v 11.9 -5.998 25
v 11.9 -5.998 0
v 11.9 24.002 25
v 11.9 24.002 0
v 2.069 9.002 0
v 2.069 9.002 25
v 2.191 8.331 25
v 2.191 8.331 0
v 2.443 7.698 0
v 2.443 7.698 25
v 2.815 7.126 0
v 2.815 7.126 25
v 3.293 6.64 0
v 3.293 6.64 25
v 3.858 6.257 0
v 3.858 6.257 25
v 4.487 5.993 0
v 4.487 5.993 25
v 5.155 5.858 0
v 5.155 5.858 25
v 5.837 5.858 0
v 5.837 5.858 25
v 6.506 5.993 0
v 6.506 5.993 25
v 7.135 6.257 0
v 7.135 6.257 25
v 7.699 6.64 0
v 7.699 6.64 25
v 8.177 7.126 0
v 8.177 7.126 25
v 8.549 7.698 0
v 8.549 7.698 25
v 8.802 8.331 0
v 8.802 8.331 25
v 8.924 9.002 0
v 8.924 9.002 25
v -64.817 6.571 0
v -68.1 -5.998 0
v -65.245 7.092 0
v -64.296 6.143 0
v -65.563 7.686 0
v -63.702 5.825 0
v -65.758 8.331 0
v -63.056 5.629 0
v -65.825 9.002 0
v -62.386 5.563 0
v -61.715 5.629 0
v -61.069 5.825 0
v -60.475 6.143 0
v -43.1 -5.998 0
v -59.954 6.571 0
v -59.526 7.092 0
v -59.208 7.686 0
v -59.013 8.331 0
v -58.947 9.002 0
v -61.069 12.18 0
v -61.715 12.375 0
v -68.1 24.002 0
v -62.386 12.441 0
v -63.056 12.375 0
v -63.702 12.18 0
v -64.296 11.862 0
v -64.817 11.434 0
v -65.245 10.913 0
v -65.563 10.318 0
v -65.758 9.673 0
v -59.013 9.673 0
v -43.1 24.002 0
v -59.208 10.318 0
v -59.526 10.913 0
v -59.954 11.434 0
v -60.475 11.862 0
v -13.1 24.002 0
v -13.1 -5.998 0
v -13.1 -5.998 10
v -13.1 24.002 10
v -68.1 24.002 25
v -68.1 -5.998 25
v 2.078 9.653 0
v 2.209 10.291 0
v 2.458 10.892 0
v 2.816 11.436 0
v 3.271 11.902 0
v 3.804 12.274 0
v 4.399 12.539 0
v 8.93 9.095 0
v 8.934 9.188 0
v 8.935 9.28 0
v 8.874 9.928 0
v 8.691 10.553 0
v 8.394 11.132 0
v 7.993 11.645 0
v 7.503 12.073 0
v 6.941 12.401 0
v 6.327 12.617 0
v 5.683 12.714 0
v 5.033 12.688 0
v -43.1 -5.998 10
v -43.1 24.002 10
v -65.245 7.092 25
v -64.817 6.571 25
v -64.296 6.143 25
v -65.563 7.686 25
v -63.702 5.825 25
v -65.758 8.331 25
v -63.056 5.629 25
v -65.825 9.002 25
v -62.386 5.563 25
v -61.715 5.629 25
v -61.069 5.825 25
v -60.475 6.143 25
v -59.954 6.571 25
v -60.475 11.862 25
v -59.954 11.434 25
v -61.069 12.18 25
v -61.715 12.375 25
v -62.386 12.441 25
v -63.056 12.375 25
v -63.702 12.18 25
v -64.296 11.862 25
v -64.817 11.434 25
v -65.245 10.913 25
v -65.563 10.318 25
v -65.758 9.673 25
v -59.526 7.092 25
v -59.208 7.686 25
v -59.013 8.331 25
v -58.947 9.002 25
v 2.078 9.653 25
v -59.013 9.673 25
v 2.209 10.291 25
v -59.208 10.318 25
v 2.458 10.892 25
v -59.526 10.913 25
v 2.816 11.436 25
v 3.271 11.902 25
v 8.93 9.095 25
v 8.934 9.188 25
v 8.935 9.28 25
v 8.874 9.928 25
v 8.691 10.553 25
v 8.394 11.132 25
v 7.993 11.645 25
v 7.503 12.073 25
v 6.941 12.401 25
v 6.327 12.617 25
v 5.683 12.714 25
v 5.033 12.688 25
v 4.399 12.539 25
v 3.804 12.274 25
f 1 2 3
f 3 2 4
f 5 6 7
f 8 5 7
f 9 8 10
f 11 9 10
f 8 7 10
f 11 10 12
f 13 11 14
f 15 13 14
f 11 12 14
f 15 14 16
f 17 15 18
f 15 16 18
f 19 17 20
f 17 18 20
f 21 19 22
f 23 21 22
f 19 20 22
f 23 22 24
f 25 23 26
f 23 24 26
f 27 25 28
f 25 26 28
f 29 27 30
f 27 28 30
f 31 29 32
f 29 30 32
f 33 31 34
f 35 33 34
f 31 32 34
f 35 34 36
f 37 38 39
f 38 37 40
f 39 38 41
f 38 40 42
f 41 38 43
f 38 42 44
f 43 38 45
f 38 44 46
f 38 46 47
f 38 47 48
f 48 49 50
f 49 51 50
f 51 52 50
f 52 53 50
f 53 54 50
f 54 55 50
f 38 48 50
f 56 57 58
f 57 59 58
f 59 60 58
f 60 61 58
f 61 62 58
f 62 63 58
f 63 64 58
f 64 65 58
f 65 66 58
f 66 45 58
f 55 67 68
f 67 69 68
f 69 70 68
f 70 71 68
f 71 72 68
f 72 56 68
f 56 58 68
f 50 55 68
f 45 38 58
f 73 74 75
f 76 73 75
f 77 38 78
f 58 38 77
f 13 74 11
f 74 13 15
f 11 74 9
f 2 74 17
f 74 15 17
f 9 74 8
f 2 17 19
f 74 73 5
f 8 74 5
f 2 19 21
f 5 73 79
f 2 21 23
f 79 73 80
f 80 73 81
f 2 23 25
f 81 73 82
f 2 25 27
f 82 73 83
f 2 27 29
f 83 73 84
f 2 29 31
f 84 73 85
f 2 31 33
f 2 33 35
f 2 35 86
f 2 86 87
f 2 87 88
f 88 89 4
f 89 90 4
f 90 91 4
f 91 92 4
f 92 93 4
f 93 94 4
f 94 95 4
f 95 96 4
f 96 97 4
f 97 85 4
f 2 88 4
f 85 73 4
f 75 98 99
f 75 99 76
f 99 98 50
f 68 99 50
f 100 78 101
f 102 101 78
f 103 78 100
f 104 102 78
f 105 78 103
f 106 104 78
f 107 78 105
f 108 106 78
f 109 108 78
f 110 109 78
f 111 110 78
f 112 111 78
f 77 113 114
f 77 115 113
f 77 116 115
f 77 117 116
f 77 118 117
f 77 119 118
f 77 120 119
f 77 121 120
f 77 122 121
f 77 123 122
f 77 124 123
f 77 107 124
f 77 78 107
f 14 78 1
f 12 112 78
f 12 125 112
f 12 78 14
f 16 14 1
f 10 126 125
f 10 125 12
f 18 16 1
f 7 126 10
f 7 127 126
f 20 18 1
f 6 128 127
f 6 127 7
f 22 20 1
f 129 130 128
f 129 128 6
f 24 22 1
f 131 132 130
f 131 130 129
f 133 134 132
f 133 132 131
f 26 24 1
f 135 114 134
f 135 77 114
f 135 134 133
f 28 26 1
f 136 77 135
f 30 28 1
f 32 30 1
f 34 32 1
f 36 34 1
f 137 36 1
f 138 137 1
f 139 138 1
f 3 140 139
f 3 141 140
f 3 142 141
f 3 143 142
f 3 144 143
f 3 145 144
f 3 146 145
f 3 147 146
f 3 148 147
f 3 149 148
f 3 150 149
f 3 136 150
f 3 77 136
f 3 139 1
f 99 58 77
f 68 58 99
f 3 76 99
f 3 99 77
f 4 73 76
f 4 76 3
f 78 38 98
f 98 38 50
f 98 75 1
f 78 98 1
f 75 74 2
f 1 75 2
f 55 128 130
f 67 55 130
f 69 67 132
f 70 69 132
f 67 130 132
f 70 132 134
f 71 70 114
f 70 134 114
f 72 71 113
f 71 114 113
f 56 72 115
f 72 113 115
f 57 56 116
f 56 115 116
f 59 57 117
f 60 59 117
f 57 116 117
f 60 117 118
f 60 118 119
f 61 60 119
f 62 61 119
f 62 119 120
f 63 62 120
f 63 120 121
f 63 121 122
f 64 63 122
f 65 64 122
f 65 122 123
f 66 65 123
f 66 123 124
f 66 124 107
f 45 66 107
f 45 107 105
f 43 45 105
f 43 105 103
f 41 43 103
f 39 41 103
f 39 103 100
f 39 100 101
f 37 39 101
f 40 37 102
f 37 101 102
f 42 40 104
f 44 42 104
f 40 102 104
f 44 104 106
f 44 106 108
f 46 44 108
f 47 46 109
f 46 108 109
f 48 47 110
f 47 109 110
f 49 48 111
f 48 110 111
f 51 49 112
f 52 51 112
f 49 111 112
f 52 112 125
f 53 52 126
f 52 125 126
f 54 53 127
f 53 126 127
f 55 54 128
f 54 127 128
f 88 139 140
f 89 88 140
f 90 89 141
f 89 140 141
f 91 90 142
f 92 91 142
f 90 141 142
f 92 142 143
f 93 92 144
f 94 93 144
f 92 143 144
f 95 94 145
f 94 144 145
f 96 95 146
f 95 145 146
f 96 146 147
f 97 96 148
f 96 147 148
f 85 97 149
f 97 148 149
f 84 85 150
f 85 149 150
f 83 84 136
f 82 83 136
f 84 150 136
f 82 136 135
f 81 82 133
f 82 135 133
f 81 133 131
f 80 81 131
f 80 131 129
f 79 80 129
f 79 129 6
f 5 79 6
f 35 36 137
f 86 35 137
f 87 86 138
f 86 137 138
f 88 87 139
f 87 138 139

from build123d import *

# Parameters (mm, degrees)
F0_W     = 80
F0_H     = 30
F1_DEPTH = 25
F2_W     = 30
F2_H     = 10
F3_DEPTH = 100
F5_DEPTH = 100
F6_R     = 3.439
F7_DEPTH = 100


with BuildPart() as f1:
    # F0 (on Top) → F1 (new body)
    with BuildSketch(Plane.XY):
        with Locations((-28.100313, 9.002365)):
            Rectangle(F0_W, F0_H)
    extrude(amount=F1_DEPTH)

    # F2 (on face) → F3 (cut)
    with BuildSketch(Plane.XZ.offset(5.997635)):
        with Locations((-28.100313, -5)):
            Rectangle(F2_W, F2_H)
        with Locations((-28.100313, 5)):
            Rectangle(F2_W, F2_H)
    extrude(amount=-F3_DEPTH, mode=Mode.SUBTRACT)

    # F4 (on face) → F5 (cut)
    with BuildSketch(Plane.XY.offset(25)):
        with BuildLine():
            ThreePointArc((8.935186, 9.280235), (5.357178, 12.716382), (2.068512, 9.002365))
            Line((2.068512, 9.002365), (8.923941, 9.002365))
            ThreePointArc((8.923941, 9.002365), (8.932373, 9.141186), (8.935186, 9.280235))
        make_face()
        with BuildLine():
            Line((8.923941, 9.002365), (2.068512, 9.002365))
            ThreePointArc((2.068512, 9.002365), (5.496227, 5.841276), (8.923941, 9.002365))
        make_face()
    extrude(amount=-F5_DEPTH, mode=Mode.SUBTRACT)

    # F6 (on face) → F7 (cut)
    with BuildSketch(Plane.XY.offset(25)):
        with Locations((-62.385514, 9.002365)):
            Circle(F6_R)
    extrude(amount=-F7_DEPTH, mode=Mode.SUBTRACT)


solid = f1.part
